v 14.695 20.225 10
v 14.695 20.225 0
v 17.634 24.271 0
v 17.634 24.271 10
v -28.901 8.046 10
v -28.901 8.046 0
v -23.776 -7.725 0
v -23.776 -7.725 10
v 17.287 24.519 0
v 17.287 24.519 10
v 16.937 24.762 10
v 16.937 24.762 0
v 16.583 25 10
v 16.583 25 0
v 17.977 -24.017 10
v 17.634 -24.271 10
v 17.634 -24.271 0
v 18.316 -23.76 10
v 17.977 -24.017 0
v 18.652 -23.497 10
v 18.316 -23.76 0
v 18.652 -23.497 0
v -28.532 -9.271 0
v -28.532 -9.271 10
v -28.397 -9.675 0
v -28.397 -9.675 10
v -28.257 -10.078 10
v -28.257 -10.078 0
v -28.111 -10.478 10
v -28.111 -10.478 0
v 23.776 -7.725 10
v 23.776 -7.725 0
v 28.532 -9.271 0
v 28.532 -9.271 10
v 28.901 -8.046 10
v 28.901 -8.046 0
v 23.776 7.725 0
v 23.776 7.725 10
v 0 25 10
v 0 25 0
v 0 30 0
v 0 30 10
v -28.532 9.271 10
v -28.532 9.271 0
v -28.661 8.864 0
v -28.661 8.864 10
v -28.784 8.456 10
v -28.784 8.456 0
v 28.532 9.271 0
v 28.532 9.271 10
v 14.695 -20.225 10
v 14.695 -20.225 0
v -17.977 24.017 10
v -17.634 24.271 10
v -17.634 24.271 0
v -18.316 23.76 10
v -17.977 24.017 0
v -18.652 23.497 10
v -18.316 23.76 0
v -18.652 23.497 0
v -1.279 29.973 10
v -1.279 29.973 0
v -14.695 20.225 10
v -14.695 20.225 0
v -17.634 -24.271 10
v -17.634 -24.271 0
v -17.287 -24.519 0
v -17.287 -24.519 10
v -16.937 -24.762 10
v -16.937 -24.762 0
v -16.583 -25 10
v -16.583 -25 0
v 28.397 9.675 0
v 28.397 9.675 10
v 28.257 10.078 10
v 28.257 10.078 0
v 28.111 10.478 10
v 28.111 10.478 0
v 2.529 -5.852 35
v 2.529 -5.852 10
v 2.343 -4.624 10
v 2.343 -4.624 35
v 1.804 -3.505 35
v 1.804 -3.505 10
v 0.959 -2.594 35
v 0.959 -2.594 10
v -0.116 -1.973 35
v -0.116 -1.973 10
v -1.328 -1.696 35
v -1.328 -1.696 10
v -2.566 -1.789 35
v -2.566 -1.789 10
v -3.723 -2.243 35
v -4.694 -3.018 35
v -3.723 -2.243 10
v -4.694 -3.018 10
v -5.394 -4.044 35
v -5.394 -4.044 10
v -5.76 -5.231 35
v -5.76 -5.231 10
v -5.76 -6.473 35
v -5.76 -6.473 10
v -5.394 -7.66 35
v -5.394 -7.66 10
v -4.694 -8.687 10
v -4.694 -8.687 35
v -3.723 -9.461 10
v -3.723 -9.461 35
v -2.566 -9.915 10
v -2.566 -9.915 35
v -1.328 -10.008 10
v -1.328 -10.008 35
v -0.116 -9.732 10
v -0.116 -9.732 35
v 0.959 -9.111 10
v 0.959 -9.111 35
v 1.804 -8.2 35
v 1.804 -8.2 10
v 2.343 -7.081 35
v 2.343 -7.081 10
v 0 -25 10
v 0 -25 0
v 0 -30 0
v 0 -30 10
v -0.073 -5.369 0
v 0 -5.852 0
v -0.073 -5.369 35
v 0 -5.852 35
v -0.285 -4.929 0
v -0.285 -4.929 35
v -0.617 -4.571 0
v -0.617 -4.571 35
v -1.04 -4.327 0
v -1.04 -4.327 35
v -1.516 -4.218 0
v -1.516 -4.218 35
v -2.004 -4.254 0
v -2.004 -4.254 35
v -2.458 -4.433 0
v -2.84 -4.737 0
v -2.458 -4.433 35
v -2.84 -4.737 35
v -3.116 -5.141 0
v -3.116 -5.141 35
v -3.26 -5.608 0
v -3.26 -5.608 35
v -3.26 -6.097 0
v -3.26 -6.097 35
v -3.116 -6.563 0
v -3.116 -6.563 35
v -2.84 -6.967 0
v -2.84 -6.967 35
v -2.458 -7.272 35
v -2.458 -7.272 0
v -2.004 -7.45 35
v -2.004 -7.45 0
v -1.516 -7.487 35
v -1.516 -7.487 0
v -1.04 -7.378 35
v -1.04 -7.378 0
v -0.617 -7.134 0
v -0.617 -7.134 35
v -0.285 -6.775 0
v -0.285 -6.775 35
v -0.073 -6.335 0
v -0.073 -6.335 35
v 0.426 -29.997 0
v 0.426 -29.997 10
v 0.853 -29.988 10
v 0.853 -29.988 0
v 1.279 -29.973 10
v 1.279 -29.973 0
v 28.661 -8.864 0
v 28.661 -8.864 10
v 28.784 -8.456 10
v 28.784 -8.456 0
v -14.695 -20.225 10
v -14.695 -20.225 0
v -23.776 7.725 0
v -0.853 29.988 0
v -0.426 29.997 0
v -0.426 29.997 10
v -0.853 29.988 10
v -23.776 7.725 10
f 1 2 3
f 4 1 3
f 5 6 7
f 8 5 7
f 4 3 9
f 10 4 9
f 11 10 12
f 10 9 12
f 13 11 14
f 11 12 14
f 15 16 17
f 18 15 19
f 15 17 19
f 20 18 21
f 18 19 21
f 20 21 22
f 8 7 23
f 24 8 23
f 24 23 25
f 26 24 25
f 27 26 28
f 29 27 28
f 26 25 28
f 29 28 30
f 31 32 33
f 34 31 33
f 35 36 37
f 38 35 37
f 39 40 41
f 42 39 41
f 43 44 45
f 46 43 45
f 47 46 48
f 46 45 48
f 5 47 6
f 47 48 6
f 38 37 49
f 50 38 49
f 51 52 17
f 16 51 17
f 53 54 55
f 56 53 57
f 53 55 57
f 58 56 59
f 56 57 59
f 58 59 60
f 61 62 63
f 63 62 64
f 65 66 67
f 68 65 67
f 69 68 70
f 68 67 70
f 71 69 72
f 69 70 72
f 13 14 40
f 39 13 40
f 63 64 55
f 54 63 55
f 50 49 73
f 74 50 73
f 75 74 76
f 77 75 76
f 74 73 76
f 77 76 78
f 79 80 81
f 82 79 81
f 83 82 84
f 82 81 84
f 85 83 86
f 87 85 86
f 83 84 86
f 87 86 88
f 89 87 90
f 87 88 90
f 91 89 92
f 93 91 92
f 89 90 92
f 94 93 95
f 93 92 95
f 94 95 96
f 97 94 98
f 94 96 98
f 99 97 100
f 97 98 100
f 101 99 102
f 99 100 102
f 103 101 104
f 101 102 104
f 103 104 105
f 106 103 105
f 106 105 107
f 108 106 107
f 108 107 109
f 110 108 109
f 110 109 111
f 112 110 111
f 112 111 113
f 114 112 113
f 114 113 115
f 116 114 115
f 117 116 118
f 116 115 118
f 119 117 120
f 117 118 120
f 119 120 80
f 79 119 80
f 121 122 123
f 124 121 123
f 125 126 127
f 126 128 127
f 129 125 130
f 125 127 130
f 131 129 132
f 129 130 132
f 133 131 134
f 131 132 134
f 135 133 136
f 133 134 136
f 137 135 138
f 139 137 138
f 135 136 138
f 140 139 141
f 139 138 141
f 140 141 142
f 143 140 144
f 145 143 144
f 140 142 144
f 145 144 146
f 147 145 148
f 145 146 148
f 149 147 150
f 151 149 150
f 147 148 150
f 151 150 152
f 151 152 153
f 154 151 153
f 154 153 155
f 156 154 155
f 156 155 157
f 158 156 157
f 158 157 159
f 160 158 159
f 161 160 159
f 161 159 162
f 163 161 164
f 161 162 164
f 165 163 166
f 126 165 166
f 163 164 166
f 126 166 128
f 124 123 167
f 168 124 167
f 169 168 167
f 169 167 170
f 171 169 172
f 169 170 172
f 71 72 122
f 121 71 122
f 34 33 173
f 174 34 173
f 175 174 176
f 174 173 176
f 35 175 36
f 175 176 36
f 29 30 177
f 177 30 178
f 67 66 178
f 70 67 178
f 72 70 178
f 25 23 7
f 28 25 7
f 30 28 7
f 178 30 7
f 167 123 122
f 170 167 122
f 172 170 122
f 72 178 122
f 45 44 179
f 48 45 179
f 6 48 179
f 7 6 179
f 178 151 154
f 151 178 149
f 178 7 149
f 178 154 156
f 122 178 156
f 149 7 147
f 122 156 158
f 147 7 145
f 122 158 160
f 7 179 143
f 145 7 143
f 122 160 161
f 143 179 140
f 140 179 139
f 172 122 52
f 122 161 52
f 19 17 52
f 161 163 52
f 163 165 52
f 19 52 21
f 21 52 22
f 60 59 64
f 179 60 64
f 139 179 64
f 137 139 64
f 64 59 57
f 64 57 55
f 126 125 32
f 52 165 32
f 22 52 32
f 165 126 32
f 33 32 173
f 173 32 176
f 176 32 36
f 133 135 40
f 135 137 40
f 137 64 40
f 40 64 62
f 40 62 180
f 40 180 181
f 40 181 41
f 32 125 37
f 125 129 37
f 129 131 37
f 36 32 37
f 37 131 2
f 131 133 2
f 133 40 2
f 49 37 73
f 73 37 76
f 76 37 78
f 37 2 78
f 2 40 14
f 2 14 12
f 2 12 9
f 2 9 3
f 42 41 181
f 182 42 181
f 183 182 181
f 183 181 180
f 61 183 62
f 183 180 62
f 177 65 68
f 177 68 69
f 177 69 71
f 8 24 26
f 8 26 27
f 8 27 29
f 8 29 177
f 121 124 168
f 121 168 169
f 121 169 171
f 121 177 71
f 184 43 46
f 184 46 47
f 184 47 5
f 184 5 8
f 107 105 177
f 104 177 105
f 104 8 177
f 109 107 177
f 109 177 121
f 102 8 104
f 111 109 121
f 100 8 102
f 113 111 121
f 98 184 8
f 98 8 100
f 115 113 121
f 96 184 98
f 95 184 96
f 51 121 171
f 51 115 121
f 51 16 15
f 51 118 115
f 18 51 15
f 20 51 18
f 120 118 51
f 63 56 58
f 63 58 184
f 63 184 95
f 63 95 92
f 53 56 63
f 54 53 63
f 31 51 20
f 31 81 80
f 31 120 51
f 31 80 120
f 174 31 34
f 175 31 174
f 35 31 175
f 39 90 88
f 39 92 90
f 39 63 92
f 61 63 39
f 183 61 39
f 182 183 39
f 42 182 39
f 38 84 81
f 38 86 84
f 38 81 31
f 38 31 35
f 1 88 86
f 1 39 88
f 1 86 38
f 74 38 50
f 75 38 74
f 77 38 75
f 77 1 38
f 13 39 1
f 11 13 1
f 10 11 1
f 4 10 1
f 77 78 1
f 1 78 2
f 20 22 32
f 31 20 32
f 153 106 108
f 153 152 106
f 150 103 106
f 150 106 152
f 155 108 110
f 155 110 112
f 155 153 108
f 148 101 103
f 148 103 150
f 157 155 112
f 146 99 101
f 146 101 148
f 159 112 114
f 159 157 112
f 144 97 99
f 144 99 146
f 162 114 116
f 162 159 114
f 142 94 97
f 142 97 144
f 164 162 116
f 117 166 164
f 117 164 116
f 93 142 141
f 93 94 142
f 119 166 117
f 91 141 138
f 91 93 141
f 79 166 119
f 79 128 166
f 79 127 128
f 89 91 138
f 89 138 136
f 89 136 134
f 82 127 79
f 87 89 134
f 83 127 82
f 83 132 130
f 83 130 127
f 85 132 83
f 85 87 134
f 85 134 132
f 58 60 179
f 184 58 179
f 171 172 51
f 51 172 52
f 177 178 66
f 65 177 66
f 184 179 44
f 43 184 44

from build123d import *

# Parameters (mm, degrees)
F1_DEPTH = 10
F2_R     = 4.167492
F3_DEPTH = 25
F4_R     = 1.638952
F5_DEPTH = 25
F6_R     = 1.638952
F7_DEPTH = 47.6


with BuildPart() as f1:
    # F0 (on Top) → F1 (new body)
    with BuildSketch(Plane.XY):
        with BuildLine():
            Line((0, 25), (0, 30))
            ThreePointArc((0, 30), (-0.639446, 29.993184), (-1.278602, 29.972741))
            Line((-1.278602, 29.972741), (-14.694631, 20.225425))
            Line((-14.694631, 20.225425), (-17.633558, 24.27051))
            ThreePointArc((-17.633558, 24.27051), (-18.146874, 23.889139), (-18.651946, 23.496913))
            Line((-18.651946, 23.496913), (-23.776413, 7.725425))
            Line((-23.776413, 7.725425), (-28.531695, 9.27051))
            ThreePointArc((-28.531695, 9.27051), (-28.722813, 8.660254), (-28.90088, 8.046063))
            Line((-28.90088, 8.046063), (-23.776413, -7.725425))
            Line((-23.776413, -7.725425), (-28.531695, -9.27051))
            ThreePointArc((-28.531695, -9.27051), (-28.327614, -9.876553), (-28.11066, -10.478109))
            Line((-28.11066, -10.478109), (-14.694631, -20.225425))
            Line((-14.694631, -20.225425), (-17.633558, -24.27051))
            ThreePointArc((-17.633558, -24.27051), (-17.112228, -24.640853), (-16.583124, -25))
            Line((-16.583124, -25), (0, -25))
            Line((0, -25), (0, -30))
            ThreePointArc((0, -30), (0.639446, -29.993184), (1.278602, -29.972741))
            Line((1.278602, -29.972741), (14.694631, -20.225425))
            Line((14.694631, -20.225425), (17.633558, -24.27051))
            ThreePointArc((17.633558, -24.27051), (18.146874, -23.889139), (18.651946, -23.496913))
            Line((18.651946, -23.496913), (23.776413, -7.725425))
            Line((23.776413, -7.725425), (28.531695, -9.27051))
            ThreePointArc((28.531695, -9.27051), (28.722813, -8.660254), (28.90088, -8.046063))
            Line((28.90088, -8.046063), (23.776413, 7.725425))
            Line((23.776413, 7.725425), (28.531695, 9.27051))
            ThreePointArc((28.531695, 9.27051), (28.327614, 9.876553), (28.11066, 10.478109))
            Line((28.11066, 10.478109), (14.694631, 20.225425))
            Line((14.694631, 20.225425), (17.633558, 24.27051))
            ThreePointArc((17.633558, 24.27051), (17.112228, 24.640853), (16.583124, 25))
            Line((16.583124, 25), (0, 25))
        make_face()
    extrude(amount=F1_DEPTH)

    # F2 (on face) → F3 (join)
    with BuildSketch(Plane.XY.offset(10)):
        with Locations((-1.638952, -5.852238)):
            Circle(F2_R)
    extrude(amount=F3_DEPTH)

    # F4 (on face) → F5 (cut)
    with BuildSketch(Plane.XY.offset(10)):
        with Locations((-1.638952, -5.852238)):
            Circle(F4_R)
    extrude(amount=-F5_DEPTH, mode=Mode.SUBTRACT)

    # F6 (on face) → F7 (cut)
    with BuildSketch(Plane.XY.offset(10)):
        with Locations((-1.638952, -5.852238)):
            Circle(F6_R)
    extrude(amount=F7_DEPTH, mode=Mode.SUBTRACT)


solid = f1.part
